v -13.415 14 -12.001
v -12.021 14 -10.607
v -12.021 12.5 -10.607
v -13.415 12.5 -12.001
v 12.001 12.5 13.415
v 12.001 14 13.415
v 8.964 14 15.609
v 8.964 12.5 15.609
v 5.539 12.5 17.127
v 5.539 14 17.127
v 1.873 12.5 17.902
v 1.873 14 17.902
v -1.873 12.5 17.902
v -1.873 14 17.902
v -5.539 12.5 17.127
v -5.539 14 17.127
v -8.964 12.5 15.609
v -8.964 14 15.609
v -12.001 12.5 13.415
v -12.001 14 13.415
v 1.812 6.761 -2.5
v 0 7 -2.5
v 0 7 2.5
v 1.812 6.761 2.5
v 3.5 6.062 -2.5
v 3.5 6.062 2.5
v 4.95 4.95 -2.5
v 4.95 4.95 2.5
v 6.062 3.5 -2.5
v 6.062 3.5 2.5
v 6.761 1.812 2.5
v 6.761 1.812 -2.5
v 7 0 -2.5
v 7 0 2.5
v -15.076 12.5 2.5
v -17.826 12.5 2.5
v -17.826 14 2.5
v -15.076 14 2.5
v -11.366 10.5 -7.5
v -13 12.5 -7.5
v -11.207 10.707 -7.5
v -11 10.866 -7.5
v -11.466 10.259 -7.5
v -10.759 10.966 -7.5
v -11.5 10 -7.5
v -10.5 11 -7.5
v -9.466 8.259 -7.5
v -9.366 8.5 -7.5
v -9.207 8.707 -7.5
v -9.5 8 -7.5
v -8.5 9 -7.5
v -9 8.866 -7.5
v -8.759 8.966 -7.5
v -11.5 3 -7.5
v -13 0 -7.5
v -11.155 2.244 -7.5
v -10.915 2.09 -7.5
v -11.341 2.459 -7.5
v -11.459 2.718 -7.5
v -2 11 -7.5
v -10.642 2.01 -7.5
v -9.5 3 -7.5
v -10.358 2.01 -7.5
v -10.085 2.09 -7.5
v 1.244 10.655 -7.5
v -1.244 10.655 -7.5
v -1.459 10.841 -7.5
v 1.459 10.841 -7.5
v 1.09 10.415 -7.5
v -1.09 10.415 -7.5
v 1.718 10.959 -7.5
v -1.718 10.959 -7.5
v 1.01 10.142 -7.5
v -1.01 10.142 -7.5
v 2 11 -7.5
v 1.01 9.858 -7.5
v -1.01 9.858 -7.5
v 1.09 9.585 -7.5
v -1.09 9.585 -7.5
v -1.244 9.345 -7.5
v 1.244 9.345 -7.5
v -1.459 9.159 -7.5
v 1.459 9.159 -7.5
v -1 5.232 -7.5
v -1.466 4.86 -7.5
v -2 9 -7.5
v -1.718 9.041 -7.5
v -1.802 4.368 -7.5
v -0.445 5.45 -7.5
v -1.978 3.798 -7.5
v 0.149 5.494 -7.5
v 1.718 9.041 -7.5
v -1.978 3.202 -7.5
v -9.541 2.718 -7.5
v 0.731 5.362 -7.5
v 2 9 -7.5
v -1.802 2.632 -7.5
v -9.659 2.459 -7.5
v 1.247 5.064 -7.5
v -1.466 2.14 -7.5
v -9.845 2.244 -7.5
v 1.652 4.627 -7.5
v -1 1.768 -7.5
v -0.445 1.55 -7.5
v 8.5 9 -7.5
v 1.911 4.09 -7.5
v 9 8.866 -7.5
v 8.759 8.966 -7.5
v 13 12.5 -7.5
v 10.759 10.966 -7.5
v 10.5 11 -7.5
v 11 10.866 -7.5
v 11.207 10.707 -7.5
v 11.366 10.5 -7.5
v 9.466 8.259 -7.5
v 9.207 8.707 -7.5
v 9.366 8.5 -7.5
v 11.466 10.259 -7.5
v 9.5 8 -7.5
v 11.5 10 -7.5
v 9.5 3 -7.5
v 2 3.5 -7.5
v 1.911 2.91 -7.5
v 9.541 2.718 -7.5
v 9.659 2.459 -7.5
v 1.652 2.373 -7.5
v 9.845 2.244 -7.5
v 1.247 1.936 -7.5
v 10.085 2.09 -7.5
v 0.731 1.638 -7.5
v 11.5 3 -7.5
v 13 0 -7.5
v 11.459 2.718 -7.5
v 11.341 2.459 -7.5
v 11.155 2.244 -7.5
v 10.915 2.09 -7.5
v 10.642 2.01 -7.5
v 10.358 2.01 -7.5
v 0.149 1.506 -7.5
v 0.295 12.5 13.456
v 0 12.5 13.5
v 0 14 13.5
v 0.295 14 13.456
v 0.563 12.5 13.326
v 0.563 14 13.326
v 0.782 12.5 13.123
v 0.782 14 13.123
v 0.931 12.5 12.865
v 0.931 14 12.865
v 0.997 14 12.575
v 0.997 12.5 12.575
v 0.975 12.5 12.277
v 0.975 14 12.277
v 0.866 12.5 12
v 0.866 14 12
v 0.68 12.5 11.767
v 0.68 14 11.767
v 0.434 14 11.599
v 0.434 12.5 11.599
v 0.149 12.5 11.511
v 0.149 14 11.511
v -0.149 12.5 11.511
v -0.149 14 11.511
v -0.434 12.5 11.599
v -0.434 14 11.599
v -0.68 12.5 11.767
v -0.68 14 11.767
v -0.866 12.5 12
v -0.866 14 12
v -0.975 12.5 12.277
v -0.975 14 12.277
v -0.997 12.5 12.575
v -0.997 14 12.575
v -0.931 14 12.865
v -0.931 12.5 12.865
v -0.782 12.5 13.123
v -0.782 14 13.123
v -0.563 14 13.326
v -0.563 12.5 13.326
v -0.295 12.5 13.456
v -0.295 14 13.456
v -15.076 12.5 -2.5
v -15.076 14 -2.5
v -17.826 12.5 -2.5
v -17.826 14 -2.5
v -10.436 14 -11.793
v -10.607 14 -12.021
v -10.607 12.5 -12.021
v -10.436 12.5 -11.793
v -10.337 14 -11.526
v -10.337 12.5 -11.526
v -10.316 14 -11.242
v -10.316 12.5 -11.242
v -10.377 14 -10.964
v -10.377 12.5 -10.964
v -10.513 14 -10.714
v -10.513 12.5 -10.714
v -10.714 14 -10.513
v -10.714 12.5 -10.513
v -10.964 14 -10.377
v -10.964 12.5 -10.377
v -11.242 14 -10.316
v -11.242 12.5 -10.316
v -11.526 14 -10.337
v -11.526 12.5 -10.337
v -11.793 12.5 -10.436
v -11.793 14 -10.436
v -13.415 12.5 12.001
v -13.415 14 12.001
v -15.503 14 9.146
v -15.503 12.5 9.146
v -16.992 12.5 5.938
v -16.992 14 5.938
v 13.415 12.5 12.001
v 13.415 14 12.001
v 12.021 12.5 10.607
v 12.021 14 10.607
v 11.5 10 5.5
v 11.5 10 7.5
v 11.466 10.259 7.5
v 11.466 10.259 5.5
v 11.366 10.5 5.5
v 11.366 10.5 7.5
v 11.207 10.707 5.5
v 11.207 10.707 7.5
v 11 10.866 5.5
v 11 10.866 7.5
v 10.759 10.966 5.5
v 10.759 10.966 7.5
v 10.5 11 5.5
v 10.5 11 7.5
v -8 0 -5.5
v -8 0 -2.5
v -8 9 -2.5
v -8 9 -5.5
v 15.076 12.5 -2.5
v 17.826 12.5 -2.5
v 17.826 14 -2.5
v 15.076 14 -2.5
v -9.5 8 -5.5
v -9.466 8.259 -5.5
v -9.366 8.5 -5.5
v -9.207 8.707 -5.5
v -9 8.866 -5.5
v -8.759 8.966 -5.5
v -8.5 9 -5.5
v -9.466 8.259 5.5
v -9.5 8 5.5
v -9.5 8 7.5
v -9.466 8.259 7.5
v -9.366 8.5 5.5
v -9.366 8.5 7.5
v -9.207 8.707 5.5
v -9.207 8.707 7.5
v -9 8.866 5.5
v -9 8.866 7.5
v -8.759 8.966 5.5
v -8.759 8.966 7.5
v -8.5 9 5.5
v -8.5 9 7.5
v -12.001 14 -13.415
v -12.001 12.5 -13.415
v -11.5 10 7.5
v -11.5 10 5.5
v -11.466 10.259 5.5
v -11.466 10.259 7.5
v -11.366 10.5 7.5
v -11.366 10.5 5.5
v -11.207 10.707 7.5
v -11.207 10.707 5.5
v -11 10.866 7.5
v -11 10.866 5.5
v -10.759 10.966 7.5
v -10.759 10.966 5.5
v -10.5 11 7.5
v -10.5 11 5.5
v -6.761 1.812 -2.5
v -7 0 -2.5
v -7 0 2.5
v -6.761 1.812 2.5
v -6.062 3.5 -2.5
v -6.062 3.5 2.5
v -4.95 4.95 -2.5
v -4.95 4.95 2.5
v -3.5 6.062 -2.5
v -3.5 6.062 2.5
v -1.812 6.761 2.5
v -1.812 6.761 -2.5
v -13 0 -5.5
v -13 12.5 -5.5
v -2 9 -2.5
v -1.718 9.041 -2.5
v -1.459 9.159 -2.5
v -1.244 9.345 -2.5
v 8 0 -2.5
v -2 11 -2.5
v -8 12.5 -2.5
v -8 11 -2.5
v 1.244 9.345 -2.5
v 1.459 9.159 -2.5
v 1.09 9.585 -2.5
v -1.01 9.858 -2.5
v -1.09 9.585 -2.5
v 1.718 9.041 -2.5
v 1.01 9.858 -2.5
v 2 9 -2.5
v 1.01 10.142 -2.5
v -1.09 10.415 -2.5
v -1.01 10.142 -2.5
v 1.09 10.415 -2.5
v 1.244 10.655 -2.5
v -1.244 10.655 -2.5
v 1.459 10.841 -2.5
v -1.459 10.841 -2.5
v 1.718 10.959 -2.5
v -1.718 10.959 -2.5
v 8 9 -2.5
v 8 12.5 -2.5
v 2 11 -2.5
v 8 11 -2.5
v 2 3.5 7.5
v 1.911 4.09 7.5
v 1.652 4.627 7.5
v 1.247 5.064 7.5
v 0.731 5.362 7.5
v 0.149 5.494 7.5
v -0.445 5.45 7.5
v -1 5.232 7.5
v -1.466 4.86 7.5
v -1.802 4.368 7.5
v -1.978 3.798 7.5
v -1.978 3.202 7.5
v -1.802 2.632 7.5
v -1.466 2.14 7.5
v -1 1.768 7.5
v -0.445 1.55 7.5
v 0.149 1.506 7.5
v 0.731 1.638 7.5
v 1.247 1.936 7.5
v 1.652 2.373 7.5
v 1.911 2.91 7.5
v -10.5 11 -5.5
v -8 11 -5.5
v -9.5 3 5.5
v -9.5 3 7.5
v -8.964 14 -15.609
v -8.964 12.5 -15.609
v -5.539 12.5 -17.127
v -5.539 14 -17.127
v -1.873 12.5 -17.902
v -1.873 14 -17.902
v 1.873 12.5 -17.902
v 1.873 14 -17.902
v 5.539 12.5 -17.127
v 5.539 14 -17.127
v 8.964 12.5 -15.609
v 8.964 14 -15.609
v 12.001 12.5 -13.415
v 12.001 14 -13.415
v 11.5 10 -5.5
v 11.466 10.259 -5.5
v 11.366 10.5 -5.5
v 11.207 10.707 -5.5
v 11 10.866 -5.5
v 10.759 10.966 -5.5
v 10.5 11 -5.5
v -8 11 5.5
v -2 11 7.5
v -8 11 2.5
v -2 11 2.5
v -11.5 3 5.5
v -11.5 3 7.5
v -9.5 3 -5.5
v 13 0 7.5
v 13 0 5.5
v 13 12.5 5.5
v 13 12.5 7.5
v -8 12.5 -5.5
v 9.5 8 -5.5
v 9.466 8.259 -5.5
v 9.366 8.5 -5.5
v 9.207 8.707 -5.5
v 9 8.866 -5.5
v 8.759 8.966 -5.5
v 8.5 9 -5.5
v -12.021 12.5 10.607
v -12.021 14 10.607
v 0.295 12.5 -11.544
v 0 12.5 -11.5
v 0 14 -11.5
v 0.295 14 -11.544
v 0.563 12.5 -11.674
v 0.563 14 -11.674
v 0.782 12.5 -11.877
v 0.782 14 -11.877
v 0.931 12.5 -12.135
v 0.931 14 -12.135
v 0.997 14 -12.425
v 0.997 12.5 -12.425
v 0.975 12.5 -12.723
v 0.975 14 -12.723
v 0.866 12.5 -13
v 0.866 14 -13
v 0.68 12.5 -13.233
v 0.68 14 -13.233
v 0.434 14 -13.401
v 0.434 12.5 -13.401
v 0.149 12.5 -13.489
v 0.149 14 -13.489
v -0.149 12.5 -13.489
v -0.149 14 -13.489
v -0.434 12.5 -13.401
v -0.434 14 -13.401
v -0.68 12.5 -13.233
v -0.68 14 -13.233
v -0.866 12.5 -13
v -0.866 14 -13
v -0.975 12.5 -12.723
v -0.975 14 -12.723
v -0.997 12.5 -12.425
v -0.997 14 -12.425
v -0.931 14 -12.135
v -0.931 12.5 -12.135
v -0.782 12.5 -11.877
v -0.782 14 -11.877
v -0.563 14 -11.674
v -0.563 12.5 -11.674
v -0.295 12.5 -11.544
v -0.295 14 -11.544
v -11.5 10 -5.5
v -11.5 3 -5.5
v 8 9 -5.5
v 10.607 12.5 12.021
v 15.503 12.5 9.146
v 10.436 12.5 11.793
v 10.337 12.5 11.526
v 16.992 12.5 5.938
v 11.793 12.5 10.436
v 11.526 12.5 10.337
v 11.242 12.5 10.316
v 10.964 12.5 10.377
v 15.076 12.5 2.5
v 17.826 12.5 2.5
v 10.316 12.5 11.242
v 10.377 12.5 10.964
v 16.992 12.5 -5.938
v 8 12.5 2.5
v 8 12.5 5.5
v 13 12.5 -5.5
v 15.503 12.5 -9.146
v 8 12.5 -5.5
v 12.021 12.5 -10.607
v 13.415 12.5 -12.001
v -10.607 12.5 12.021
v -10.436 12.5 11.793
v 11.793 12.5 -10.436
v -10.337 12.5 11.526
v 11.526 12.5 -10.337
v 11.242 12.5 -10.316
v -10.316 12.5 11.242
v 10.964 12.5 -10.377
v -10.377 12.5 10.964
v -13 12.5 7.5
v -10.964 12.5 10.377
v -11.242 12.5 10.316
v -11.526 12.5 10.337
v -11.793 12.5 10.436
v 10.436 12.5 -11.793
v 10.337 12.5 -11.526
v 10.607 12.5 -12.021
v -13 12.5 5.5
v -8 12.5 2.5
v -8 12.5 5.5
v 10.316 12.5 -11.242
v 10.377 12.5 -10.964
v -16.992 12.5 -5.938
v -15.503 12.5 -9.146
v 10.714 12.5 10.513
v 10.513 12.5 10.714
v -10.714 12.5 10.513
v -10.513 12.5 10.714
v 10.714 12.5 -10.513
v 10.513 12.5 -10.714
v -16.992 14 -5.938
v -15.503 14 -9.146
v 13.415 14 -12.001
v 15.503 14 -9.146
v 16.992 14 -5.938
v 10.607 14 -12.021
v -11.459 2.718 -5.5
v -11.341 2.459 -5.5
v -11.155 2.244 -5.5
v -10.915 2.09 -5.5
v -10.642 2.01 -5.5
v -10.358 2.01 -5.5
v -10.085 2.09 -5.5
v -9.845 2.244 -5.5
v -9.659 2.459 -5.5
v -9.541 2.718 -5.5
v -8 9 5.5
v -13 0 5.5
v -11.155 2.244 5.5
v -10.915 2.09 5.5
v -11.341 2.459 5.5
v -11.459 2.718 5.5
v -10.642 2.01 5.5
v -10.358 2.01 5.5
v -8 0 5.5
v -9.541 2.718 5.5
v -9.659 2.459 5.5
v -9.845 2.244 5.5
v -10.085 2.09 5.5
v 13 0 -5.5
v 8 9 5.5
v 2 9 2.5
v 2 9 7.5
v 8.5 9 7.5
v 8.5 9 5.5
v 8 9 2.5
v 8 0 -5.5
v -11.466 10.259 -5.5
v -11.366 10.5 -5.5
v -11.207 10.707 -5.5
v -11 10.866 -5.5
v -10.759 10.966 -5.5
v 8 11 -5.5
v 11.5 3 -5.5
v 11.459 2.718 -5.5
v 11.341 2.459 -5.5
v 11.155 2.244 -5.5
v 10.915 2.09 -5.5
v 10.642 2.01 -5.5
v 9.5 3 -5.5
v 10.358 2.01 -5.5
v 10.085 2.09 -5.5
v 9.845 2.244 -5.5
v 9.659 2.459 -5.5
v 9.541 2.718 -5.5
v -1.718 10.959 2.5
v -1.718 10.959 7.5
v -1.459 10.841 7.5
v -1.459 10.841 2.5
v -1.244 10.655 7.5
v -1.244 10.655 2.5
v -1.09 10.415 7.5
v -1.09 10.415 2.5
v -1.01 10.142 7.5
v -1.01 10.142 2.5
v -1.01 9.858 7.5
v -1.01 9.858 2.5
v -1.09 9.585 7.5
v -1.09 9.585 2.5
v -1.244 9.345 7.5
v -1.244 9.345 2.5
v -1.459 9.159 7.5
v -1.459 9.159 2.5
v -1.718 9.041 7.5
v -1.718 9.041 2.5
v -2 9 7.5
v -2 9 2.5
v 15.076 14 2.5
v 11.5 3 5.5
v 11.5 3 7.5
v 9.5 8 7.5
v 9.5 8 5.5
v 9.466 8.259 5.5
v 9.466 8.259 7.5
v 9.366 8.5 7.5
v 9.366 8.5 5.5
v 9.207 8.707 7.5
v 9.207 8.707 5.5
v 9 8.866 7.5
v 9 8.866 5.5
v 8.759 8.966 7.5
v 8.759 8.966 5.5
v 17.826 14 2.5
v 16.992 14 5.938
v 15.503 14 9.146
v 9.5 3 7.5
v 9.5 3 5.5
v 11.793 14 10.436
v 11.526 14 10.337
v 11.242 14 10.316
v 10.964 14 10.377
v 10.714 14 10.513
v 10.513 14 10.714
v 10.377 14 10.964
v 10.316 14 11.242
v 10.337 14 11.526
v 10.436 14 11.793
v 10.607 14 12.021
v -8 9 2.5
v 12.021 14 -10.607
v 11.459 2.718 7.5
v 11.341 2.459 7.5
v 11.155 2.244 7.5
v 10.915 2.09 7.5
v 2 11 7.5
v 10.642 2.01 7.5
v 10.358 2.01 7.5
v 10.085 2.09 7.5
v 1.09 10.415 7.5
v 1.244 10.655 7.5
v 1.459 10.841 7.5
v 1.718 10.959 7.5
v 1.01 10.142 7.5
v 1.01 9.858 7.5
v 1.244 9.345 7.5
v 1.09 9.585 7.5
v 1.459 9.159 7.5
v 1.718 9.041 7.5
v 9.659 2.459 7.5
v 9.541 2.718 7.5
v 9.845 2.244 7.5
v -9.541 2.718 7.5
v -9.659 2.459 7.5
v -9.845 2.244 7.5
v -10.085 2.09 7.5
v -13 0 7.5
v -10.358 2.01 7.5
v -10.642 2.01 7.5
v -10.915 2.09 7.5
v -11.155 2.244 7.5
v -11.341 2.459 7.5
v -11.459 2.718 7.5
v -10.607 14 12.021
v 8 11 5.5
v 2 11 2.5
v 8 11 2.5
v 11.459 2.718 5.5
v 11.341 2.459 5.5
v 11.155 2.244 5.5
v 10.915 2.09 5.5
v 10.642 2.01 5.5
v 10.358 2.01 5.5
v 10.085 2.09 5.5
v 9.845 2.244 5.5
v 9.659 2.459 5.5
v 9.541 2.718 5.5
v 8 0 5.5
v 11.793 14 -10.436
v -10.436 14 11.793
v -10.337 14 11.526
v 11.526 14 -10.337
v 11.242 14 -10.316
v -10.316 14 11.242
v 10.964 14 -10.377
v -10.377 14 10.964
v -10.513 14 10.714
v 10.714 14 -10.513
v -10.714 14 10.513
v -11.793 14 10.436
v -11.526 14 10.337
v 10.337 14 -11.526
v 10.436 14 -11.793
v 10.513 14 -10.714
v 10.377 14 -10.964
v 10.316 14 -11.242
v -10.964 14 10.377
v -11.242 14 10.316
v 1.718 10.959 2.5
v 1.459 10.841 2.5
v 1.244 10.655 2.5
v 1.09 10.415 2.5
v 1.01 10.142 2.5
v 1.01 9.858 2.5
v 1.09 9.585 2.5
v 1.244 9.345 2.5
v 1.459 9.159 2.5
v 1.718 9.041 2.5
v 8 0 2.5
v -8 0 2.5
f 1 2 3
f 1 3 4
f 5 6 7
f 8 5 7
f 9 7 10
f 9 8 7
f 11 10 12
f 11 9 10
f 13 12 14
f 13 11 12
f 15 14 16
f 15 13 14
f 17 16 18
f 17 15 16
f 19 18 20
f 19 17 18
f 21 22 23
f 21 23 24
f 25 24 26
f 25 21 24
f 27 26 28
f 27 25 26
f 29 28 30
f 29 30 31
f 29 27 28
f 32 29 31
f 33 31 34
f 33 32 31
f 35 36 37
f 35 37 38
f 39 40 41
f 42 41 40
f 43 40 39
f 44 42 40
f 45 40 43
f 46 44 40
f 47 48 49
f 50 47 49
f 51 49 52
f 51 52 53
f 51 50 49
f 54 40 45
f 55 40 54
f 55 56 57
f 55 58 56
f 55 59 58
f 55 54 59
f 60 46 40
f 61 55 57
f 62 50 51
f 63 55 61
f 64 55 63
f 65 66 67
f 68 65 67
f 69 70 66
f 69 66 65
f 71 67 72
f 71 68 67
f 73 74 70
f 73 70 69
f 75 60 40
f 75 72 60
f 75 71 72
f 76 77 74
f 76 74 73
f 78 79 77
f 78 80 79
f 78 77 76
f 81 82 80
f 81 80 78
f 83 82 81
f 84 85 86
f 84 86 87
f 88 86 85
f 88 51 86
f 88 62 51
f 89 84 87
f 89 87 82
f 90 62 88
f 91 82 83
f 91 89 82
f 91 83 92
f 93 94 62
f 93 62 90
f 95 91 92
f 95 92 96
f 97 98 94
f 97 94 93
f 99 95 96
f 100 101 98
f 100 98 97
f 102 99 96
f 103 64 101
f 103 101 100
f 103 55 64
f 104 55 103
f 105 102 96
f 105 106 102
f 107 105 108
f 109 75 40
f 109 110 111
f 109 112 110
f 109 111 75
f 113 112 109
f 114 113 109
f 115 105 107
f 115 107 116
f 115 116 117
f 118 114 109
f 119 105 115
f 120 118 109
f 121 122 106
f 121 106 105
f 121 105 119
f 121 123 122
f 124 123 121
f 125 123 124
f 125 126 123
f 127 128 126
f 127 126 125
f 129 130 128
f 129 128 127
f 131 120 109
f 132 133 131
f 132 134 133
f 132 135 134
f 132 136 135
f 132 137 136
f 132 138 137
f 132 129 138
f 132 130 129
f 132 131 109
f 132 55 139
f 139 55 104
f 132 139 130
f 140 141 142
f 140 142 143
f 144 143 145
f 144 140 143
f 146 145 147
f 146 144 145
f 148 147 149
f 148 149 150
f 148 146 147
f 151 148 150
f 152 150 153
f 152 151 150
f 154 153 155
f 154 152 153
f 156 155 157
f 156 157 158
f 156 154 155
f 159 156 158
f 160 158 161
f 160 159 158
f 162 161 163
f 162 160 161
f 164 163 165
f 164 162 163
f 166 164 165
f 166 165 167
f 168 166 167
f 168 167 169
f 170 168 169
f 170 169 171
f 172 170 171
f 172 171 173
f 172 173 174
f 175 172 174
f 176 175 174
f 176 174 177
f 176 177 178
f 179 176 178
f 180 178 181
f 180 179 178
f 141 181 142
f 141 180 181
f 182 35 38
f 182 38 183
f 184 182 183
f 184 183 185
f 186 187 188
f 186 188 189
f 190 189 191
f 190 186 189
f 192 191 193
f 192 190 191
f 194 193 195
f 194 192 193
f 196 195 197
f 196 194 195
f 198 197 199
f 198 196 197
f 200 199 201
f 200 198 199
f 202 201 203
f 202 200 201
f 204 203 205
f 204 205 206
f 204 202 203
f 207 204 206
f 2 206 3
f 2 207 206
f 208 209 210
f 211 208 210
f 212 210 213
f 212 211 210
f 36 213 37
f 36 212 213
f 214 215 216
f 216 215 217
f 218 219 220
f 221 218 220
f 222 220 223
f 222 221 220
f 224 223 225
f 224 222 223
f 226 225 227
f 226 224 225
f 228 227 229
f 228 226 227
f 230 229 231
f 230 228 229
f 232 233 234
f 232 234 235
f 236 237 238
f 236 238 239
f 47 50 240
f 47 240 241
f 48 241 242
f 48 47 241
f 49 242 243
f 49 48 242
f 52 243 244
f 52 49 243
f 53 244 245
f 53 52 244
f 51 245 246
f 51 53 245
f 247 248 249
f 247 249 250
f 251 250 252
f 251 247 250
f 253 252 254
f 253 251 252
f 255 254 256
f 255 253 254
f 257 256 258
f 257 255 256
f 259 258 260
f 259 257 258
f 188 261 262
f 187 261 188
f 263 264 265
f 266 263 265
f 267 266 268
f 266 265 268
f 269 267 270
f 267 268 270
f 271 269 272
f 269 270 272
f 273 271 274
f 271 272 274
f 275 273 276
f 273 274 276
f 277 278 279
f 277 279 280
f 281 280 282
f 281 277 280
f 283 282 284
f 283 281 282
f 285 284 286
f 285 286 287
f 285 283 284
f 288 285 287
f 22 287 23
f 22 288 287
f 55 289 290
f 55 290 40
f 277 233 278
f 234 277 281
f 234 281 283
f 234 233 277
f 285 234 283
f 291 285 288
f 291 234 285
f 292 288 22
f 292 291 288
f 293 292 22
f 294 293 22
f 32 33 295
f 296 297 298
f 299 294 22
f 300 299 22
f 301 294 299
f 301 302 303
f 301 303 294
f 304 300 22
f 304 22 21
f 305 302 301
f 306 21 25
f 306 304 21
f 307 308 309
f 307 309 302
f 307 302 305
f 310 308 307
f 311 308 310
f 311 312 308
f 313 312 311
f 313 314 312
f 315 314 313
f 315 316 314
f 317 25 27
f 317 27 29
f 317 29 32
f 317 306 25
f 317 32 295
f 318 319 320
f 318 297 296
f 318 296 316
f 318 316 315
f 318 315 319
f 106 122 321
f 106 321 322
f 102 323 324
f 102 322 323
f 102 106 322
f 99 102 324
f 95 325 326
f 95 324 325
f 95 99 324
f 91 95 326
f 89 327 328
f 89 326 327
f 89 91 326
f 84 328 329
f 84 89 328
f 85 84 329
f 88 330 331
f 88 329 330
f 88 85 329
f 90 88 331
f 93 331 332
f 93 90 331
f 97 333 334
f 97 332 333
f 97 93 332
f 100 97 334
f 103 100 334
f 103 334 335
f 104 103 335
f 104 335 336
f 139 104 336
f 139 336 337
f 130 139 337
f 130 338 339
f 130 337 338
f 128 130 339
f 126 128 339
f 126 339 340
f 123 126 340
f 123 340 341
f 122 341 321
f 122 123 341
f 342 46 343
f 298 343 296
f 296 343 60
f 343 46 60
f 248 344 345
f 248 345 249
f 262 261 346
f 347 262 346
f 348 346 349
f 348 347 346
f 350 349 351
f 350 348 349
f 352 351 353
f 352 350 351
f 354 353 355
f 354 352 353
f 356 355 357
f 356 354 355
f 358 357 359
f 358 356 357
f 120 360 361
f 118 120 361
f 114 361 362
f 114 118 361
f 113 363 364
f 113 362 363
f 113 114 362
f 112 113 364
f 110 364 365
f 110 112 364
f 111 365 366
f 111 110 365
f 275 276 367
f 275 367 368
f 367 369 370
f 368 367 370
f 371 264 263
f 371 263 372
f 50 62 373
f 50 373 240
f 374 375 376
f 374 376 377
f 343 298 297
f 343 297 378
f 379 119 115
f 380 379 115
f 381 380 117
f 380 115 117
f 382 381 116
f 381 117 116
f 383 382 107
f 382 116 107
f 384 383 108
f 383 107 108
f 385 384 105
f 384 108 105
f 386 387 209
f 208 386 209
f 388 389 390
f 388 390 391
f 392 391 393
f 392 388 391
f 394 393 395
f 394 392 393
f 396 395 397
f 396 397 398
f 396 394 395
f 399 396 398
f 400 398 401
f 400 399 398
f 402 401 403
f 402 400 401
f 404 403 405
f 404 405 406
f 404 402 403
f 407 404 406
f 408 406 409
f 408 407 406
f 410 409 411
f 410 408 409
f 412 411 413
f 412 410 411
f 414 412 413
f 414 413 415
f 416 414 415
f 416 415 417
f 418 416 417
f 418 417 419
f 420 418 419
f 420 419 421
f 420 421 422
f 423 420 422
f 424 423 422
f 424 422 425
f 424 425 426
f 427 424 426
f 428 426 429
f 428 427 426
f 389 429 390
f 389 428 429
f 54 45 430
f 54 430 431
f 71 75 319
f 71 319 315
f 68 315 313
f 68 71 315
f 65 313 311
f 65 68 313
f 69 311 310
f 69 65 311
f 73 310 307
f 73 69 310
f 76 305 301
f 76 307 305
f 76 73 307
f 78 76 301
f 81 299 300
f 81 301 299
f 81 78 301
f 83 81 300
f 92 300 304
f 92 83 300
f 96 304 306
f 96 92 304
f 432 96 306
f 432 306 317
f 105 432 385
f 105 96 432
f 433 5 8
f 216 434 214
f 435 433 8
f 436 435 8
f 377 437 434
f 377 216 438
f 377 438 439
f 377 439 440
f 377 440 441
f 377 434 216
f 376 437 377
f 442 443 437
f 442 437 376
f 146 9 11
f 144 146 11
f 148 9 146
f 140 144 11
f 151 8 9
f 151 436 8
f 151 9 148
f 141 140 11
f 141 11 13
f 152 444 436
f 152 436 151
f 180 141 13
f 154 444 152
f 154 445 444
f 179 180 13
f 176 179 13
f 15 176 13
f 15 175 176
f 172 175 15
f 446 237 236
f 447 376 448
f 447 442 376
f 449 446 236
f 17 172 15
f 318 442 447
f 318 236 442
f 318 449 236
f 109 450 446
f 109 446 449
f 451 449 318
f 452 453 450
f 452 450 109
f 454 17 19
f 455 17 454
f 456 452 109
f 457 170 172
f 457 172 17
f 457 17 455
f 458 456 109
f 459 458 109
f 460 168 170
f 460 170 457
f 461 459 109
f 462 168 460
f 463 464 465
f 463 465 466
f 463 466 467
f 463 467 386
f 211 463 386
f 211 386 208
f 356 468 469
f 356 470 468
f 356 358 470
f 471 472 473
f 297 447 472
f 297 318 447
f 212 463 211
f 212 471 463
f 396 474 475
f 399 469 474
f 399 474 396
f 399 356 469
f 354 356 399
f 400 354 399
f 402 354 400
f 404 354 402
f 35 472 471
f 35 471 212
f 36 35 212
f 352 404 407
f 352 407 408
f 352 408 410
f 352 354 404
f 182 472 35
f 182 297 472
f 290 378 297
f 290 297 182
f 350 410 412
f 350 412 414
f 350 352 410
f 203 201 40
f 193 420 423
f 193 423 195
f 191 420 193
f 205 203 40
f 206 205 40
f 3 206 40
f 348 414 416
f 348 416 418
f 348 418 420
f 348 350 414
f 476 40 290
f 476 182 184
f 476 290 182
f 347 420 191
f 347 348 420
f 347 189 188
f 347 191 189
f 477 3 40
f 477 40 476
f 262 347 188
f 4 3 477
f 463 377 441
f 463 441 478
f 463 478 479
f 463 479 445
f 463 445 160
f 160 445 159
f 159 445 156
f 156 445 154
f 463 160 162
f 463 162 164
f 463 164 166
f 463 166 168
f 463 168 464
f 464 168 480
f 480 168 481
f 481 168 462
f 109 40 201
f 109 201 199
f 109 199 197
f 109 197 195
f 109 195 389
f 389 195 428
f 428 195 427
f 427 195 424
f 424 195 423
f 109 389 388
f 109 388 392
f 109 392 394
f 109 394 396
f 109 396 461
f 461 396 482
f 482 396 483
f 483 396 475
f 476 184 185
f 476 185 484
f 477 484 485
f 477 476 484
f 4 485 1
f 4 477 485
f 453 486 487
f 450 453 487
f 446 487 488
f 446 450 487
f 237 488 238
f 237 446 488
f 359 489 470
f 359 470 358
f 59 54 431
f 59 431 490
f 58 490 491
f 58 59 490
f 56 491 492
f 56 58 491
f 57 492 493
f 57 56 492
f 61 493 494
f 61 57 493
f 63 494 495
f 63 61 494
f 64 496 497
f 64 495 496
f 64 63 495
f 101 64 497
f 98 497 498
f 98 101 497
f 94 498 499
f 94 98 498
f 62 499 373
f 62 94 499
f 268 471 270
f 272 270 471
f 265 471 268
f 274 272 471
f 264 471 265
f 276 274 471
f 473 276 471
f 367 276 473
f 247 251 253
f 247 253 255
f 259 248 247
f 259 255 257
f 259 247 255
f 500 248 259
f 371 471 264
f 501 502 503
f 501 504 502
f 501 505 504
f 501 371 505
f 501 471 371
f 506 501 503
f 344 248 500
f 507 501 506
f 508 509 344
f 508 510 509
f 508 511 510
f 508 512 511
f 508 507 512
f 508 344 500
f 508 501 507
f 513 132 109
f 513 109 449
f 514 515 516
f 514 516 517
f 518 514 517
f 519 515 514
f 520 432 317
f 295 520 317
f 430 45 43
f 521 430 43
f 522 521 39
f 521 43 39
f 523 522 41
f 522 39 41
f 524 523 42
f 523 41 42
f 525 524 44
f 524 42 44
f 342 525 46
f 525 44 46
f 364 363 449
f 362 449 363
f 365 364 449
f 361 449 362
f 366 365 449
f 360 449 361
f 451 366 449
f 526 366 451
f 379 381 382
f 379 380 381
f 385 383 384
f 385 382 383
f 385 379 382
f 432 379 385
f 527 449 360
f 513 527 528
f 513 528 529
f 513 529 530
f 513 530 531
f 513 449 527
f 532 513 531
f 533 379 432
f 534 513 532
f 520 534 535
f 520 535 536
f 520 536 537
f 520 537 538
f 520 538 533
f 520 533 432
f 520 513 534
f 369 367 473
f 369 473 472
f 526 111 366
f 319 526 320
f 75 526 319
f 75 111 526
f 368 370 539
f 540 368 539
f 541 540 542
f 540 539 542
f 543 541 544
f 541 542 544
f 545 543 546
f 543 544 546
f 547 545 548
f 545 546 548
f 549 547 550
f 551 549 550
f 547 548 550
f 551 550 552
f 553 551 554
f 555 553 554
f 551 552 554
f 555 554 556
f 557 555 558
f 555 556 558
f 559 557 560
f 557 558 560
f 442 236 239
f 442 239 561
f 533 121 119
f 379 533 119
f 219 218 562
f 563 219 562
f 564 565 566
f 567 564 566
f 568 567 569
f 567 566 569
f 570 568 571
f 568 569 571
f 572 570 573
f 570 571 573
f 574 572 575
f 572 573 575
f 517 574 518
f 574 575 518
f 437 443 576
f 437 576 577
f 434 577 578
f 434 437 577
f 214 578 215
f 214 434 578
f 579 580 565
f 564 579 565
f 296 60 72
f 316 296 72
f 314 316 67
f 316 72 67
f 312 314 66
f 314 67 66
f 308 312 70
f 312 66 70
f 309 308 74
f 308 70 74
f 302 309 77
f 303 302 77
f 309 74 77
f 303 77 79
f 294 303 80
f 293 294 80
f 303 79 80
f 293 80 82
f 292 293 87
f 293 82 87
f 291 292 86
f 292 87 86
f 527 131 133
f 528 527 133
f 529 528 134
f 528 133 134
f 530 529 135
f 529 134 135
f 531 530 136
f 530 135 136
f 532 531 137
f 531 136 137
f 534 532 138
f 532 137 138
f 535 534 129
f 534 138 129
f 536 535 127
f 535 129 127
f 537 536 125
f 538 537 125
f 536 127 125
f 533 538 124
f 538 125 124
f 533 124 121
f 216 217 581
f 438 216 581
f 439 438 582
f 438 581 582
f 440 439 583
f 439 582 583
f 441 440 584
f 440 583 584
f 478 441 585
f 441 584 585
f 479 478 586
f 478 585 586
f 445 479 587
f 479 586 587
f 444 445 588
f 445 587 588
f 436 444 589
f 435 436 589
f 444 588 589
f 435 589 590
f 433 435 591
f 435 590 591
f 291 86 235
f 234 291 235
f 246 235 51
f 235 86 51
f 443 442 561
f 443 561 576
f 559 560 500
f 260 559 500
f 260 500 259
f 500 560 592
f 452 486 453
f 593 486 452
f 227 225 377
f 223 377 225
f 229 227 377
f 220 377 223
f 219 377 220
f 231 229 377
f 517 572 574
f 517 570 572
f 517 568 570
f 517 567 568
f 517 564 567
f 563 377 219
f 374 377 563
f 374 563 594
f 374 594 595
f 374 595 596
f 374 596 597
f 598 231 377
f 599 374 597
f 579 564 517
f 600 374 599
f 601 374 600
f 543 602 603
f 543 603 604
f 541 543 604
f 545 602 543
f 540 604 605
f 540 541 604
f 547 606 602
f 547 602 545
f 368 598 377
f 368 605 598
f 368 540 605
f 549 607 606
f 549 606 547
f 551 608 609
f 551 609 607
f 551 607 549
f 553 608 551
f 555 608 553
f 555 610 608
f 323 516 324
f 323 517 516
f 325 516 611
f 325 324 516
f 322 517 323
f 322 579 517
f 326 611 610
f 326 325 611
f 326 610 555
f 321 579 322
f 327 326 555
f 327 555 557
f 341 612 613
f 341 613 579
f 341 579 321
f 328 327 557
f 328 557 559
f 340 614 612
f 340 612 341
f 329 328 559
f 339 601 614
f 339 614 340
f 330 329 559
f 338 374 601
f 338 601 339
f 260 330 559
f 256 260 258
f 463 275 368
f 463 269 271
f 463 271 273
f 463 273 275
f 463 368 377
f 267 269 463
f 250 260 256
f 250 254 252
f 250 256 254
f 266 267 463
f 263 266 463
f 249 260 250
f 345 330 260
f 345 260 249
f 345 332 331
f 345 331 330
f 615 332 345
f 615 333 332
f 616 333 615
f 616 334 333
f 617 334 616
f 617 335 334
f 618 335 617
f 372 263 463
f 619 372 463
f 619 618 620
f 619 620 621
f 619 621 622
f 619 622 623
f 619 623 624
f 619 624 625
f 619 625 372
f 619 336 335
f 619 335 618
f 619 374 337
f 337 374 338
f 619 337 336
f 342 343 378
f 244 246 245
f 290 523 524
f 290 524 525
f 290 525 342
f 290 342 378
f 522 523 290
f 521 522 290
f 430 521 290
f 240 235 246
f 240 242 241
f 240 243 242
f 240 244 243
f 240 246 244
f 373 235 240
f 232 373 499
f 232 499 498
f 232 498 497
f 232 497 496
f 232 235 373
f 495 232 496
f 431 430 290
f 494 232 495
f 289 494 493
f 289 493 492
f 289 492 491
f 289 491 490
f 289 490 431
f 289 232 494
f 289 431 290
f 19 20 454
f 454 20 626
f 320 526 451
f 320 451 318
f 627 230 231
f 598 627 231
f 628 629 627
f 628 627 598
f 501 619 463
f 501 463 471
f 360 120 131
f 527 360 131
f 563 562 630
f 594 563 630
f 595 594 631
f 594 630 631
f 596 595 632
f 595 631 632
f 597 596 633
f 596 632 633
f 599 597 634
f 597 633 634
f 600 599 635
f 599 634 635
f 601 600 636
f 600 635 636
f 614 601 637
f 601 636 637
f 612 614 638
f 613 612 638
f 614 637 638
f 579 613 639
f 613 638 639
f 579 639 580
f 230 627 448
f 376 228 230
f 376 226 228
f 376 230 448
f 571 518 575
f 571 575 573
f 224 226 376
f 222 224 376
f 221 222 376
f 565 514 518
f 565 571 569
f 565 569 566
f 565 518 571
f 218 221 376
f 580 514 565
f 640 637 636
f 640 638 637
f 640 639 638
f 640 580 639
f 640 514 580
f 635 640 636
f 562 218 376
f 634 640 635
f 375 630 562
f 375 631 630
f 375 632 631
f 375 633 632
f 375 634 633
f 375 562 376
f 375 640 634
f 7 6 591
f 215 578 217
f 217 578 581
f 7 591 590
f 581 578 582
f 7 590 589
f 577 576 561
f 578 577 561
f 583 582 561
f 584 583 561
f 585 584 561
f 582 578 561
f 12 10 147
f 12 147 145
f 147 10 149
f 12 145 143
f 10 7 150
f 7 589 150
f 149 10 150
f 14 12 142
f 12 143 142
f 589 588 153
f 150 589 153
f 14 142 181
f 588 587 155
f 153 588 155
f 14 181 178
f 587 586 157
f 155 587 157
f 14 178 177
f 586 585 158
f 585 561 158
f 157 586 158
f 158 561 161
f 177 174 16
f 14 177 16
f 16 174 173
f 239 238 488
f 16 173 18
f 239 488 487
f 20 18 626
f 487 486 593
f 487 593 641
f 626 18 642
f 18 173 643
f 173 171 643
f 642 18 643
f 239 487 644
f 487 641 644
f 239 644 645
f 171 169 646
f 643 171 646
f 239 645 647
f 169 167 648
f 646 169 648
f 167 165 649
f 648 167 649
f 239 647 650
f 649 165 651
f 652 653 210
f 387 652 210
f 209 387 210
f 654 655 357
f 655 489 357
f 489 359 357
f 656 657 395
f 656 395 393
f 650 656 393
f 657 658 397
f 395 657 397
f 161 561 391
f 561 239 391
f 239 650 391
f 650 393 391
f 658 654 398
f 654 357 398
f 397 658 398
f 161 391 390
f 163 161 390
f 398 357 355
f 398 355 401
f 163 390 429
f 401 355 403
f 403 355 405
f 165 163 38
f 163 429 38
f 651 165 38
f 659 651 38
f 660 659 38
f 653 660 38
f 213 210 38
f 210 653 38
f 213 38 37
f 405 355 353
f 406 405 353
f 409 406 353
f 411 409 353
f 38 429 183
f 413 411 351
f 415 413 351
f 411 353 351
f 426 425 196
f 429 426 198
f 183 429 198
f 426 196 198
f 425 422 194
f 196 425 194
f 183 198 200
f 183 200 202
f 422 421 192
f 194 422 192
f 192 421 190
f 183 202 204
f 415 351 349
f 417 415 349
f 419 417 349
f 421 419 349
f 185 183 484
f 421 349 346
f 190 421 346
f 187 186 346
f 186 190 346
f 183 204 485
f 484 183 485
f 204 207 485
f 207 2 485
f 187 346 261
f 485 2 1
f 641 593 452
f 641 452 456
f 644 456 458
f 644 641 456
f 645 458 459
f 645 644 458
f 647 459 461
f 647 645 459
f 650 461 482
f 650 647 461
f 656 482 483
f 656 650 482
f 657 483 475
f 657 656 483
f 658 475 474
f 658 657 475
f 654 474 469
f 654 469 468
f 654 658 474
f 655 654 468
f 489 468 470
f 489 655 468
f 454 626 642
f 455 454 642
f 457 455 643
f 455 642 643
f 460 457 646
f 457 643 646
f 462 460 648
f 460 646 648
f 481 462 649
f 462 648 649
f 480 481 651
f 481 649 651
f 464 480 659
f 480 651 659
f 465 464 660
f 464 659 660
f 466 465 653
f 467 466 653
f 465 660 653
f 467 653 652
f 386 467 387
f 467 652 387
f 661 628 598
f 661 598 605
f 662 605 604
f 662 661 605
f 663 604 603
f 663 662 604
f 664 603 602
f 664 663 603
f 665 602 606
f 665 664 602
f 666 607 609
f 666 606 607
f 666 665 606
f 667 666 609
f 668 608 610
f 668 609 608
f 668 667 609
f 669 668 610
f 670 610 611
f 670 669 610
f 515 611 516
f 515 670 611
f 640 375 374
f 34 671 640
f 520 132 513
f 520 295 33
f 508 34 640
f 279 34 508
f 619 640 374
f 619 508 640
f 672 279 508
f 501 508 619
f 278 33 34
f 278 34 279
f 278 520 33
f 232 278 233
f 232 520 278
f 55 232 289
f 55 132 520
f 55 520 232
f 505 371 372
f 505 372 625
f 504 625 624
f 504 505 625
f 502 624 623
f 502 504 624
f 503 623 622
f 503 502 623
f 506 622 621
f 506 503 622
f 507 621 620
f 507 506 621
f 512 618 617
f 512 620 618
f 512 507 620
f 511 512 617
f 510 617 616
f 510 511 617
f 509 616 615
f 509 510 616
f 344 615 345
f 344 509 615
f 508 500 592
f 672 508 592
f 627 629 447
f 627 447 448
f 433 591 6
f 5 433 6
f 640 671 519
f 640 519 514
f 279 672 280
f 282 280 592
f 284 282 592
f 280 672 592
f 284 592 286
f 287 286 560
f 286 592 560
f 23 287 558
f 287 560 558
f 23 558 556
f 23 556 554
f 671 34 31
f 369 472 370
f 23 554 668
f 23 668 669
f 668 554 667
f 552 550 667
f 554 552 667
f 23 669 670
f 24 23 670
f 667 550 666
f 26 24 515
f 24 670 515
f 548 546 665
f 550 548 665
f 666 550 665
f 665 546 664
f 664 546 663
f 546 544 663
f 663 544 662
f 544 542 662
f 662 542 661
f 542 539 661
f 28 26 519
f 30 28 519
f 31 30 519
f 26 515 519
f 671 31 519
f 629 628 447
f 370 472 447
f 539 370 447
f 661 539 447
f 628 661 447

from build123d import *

# Parameters (mm, degrees)
EXTRUDE_1_DEPTH           = 12.5
CUT_EXTRUDE_1_DEPTH       = 20.532024985
CUT_EXTRUDE_1_DEPTH_BACK  = 20.532024985
SKETCH_2_R                = 2
CUT_EXTRUDE_2_DEPTH       = 20.532024985
CUT_EXTRUDE_2_DEPTH_BACK  = 20.532024985
CUT_EXTRUDE_START         = 12.5
SKETCH_5_W                = 16
SKETCH_5_H                = 5
CUT_EXTRUDE_4_DEPTH       = 5.5
CUT_EXTRUDE_5_DEPTH       = 2.5
CUT_EXTRUDE_5_DEPTH_BACK  = 2.5
EXTRUDE_START             = 12.5
EXTRUDE_5_DEPTH           = 1.5
SKETCH_8_R                = 1
CUT_EXTRUDE_6_DEPTH       = 1.5
CUT_EXTRUDE_START_2       = 14
CUT_EXTRUDE_7_DEPTH       = 1.5
CUT_EXTRUDE_9_DEPTH       = 29.943911277
CUT_EXTRUDE_9_DEPTH_BACK  = 29.943911277
CUT_EXTRUDE_10_DEPTH      = 29.943911277
CUT_EXTRUDE_10_DEPTH_BACK = 29.943911277


with BuildPart() as part:
    # 草图1 → 凸台-拉伸1 (new body)
    with BuildSketch(Plane(origin=(0, 0, 0), x_dir=(1, 0, 0), z_dir=(0, 1, 0))):
        Polygon((13, 5.5), (8, 5.5), (8, -5.5), (13, -5.5), (13, -7.5), (-13, -7.5), (-13, -5.5), (-8, -5.5), (-8, 5.5), (-13, 5.5), (-13, 7.5), (13, 7.5), align=None)
    extrude(amount=EXTRUDE_1_DEPTH)

    # 草图2 → 切除-拉伸1 (cut, two sides: drawn at the far end of the back side and taken through both)
    with BuildSketch(Plane.XY.offset(-CUT_EXTRUDE_1_DEPTH_BACK)):
        with Locations((0, 3.5)):
            Circle(SKETCH_2_R)
    extrude(amount=CUT_EXTRUDE_1_DEPTH + CUT_EXTRUDE_1_DEPTH_BACK, mode=Mode.SUBTRACT)

    # 草图3 → 切除-拉伸2 (cut, two sides: drawn at the far end of the back side and taken through both)
    with BuildSketch(Plane.XY.offset(-CUT_EXTRUDE_2_DEPTH_BACK)):
        with BuildLine():
            Line((-10.5, 11), (-2, 11))
            ThreePointArc((-2, 11), (-1, 10), (-2, 9))
            Line((-2, 9), (-10.5, 9))
            ThreePointArc((-10.5, 9), (-11.5, 10), (-10.5, 11))
        make_face()
        with BuildLine():
            Line((2, 9), (10.5, 9))
            ThreePointArc((10.5, 9), (11.5, 10), (10.5, 11))
            Line((10.5, 11), (2, 11))
            ThreePointArc((2, 11), (1, 10), (2, 9))
        make_face()
    extrude(amount=CUT_EXTRUDE_2_DEPTH + CUT_EXTRUDE_2_DEPTH_BACK, mode=Mode.SUBTRACT)

    # 草图5 → 切除-拉伸4 (cut)
    with BuildSketch(Plane(origin=(0, 0, 0), x_dir=(1, 0, 0), z_dir=(0, 1, 0)).offset(CUT_EXTRUDE_START)):
        Rectangle(SKETCH_5_W, SKETCH_5_H)
    extrude(amount=-CUT_EXTRUDE_4_DEPTH, mode=Mode.SUBTRACT)

    # 草图6 → 切除-拉伸5 (cut, two sides: drawn at the far end of the back side and taken through both)
    with BuildSketch(Plane.XY.offset(-CUT_EXTRUDE_5_DEPTH_BACK)):
        with BuildLine():
            Line((8, 7), (0, 7))
            ThreePointArc((0, 7), (4.949747468, 4.949747468), (7, 0))
            Line((7, 0), (8, 0))
            Line((8, 0), (8, 7))
        make_face()
        with BuildLine():
            Line((-8, 7), (-8, 0))
            Line((-8, 0), (-7, 0))
            ThreePointArc((-7, 0), (-4.949747468, 4.949747468), (0, 7))
            Line((0, 7), (-8, 7))
        make_face()
    extrude(amount=CUT_EXTRUDE_5_DEPTH + CUT_EXTRUDE_5_DEPTH_BACK, mode=Mode.SUBTRACT)

    # 草图7 → 凸台-拉伸5 (add)
    with BuildSketch(Plane(origin=(0, 0, 0), x_dir=(1, 0, 0), z_dir=(0, 1, 0)).offset(EXTRUDE_START)):
        with BuildLine():
            Line((17.82554347, 2.5), (15.07554347, 2.5))
            Line((15.07554347, 2.5), (15.07554347, -2.5))
            Line((15.07554347, -2.5), (17.82554347, -2.5))
            ThreePointArc((17.82554347, -2.5), (0, -18), (-17.82554347, -2.5))
            Line((-17.82554347, -2.5), (-15.07554347, -2.5))
            Line((-15.07554347, -2.5), (-15.07554347, 2.5))
            Line((-15.07554347, 2.5), (-17.82554347, 2.5))
            ThreePointArc((-17.82554347, 2.5), (0, 18), (17.82554347, 2.5))
        make_face()
    extrude(amount=EXTRUDE_5_DEPTH)

    # 草图8 → 切除-拉伸6 (cut)
    with BuildSketch(Plane(origin=(0, 0, 0), x_dir=(1, 0, 0), z_dir=(0, 1, 0)).offset(CUT_EXTRUDE_START)):
        with Locations(Location((0, 12.5, 0), (0, 0, 270))):
            Circle(SKETCH_8_R)
        with Locations(Location((0, -12.5, 0), (0, 0, 270))):
            Circle(SKETCH_8_R)
    extrude(amount=CUT_EXTRUDE_6_DEPTH, mode=Mode.SUBTRACT)

    # 草图9 → 切除-拉伸7 (cut)
    with BuildSketch(Plane(origin=(0, 0, 0), x_dir=(1, 0, 0), z_dir=(0, 1, 0)).offset(CUT_EXTRUDE_START_2)):
        with BuildLine():
            Line((-12.02081528, 10.606601718), (-13.435028843, 12.02081528))
            ThreePointArc((-13.435028843, 12.02081528), (-13.435028843, 13.435028843), (-12.02081528, 13.435028843))
            Line((-12.02081528, 13.435028843), (-10.606601718, 12.02081528))
            ThreePointArc((-10.606601718, 12.02081528), (-10.606601718, 10.606601718), (-12.02081528, 10.606601718))
        make_face()
        with BuildLine():
            Line((10.606601718, -12.02081528), (12.02081528, -13.435028843))
            ThreePointArc((12.02081528, -13.435028843), (13.435028843, -13.435028843), (13.435028843, -12.02081528))
            Line((13.435028843, -12.02081528), (12.02081528, -10.606601718))
            ThreePointArc((12.02081528, -10.606601718), (10.606601718, -10.606601718), (10.606601718, -12.02081528))
        make_face()
        with BuildLine():
            Line((-12.02081528, -10.606601718), (-13.435028843, -12.02081528))
            ThreePointArc((-13.435028843, -12.02081528), (-13.435028843, -13.435028843), (-12.02081528, -13.435028843))
            Line((-12.02081528, -13.435028843), (-10.606601718, -12.02081528))
            ThreePointArc((-10.606601718, -12.02081528), (-10.606601718, -10.606601718), (-12.02081528, -10.606601718))
        make_face()
        with BuildLine():
            Line((10.606601718, 12.02081528), (12.02081528, 13.435028843))
            ThreePointArc((12.02081528, 13.435028843), (13.435028843, 13.435028843), (13.435028843, 12.02081528))
            Line((13.435028843, 12.02081528), (12.02081528, 10.606601718))
            ThreePointArc((12.02081528, 10.606601718), (10.606601718, 10.606601718), (10.606601718, 12.02081528))
        make_face()
    extrude(amount=-CUT_EXTRUDE_7_DEPTH, mode=Mode.SUBTRACT)

    # 草图10 → 切除-拉伸9 (cut, two sides: drawn at the far end of the back side and taken through both)
    with BuildSketch(Plane.XY.offset(-CUT_EXTRUDE_9_DEPTH_BACK)):
        with BuildLine():
            Line((-11.5, 10), (-11.5, 3))
            ThreePointArc((-11.5, 3), (-10.5, 2), (-9.5, 3))
            Line((-9.5, 3), (-9.5, 10))
            ThreePointArc((-9.5, 10), (-10.5, 11), (-11.5, 10))
        make_face()
        with BuildLine():
            Line((11.5, 10), (11.5, 3))
            ThreePointArc((11.5, 3), (10.5, 2), (9.5, 3))
            Line((9.5, 3), (9.5, 10))
            ThreePointArc((9.5, 10), (10.5, 11), (11.5, 10))
        make_face()
    extrude(amount=CUT_EXTRUDE_9_DEPTH + CUT_EXTRUDE_9_DEPTH_BACK, mode=Mode.SUBTRACT)

    # 草图11 → 切除-拉伸10 (cut, two sides: drawn at the far end of the back side and taken through both)
    with BuildSketch(Plane.XY.offset(-CUT_EXTRUDE_10_DEPTH_BACK)):
        with BuildLine():
            Line((8.5, 9), (9.5, 9))
            Line((9.5, 9), (9.5, 8))
            ThreePointArc((9.5, 8), (9.207106781, 8.707106781), (8.5, 9))
        make_face()
        with BuildLine():
            Line((-9.5, 9), (-9.5, 8))
            ThreePointArc((-9.5, 8), (-9.207106781, 8.707106781), (-8.5, 9))
            Line((-8.5, 9), (-9.5, 9))
        make_face()
    extrude(amount=CUT_EXTRUDE_10_DEPTH + CUT_EXTRUDE_10_DEPTH_BACK, mode=Mode.SUBTRACT)


solid = part.part
